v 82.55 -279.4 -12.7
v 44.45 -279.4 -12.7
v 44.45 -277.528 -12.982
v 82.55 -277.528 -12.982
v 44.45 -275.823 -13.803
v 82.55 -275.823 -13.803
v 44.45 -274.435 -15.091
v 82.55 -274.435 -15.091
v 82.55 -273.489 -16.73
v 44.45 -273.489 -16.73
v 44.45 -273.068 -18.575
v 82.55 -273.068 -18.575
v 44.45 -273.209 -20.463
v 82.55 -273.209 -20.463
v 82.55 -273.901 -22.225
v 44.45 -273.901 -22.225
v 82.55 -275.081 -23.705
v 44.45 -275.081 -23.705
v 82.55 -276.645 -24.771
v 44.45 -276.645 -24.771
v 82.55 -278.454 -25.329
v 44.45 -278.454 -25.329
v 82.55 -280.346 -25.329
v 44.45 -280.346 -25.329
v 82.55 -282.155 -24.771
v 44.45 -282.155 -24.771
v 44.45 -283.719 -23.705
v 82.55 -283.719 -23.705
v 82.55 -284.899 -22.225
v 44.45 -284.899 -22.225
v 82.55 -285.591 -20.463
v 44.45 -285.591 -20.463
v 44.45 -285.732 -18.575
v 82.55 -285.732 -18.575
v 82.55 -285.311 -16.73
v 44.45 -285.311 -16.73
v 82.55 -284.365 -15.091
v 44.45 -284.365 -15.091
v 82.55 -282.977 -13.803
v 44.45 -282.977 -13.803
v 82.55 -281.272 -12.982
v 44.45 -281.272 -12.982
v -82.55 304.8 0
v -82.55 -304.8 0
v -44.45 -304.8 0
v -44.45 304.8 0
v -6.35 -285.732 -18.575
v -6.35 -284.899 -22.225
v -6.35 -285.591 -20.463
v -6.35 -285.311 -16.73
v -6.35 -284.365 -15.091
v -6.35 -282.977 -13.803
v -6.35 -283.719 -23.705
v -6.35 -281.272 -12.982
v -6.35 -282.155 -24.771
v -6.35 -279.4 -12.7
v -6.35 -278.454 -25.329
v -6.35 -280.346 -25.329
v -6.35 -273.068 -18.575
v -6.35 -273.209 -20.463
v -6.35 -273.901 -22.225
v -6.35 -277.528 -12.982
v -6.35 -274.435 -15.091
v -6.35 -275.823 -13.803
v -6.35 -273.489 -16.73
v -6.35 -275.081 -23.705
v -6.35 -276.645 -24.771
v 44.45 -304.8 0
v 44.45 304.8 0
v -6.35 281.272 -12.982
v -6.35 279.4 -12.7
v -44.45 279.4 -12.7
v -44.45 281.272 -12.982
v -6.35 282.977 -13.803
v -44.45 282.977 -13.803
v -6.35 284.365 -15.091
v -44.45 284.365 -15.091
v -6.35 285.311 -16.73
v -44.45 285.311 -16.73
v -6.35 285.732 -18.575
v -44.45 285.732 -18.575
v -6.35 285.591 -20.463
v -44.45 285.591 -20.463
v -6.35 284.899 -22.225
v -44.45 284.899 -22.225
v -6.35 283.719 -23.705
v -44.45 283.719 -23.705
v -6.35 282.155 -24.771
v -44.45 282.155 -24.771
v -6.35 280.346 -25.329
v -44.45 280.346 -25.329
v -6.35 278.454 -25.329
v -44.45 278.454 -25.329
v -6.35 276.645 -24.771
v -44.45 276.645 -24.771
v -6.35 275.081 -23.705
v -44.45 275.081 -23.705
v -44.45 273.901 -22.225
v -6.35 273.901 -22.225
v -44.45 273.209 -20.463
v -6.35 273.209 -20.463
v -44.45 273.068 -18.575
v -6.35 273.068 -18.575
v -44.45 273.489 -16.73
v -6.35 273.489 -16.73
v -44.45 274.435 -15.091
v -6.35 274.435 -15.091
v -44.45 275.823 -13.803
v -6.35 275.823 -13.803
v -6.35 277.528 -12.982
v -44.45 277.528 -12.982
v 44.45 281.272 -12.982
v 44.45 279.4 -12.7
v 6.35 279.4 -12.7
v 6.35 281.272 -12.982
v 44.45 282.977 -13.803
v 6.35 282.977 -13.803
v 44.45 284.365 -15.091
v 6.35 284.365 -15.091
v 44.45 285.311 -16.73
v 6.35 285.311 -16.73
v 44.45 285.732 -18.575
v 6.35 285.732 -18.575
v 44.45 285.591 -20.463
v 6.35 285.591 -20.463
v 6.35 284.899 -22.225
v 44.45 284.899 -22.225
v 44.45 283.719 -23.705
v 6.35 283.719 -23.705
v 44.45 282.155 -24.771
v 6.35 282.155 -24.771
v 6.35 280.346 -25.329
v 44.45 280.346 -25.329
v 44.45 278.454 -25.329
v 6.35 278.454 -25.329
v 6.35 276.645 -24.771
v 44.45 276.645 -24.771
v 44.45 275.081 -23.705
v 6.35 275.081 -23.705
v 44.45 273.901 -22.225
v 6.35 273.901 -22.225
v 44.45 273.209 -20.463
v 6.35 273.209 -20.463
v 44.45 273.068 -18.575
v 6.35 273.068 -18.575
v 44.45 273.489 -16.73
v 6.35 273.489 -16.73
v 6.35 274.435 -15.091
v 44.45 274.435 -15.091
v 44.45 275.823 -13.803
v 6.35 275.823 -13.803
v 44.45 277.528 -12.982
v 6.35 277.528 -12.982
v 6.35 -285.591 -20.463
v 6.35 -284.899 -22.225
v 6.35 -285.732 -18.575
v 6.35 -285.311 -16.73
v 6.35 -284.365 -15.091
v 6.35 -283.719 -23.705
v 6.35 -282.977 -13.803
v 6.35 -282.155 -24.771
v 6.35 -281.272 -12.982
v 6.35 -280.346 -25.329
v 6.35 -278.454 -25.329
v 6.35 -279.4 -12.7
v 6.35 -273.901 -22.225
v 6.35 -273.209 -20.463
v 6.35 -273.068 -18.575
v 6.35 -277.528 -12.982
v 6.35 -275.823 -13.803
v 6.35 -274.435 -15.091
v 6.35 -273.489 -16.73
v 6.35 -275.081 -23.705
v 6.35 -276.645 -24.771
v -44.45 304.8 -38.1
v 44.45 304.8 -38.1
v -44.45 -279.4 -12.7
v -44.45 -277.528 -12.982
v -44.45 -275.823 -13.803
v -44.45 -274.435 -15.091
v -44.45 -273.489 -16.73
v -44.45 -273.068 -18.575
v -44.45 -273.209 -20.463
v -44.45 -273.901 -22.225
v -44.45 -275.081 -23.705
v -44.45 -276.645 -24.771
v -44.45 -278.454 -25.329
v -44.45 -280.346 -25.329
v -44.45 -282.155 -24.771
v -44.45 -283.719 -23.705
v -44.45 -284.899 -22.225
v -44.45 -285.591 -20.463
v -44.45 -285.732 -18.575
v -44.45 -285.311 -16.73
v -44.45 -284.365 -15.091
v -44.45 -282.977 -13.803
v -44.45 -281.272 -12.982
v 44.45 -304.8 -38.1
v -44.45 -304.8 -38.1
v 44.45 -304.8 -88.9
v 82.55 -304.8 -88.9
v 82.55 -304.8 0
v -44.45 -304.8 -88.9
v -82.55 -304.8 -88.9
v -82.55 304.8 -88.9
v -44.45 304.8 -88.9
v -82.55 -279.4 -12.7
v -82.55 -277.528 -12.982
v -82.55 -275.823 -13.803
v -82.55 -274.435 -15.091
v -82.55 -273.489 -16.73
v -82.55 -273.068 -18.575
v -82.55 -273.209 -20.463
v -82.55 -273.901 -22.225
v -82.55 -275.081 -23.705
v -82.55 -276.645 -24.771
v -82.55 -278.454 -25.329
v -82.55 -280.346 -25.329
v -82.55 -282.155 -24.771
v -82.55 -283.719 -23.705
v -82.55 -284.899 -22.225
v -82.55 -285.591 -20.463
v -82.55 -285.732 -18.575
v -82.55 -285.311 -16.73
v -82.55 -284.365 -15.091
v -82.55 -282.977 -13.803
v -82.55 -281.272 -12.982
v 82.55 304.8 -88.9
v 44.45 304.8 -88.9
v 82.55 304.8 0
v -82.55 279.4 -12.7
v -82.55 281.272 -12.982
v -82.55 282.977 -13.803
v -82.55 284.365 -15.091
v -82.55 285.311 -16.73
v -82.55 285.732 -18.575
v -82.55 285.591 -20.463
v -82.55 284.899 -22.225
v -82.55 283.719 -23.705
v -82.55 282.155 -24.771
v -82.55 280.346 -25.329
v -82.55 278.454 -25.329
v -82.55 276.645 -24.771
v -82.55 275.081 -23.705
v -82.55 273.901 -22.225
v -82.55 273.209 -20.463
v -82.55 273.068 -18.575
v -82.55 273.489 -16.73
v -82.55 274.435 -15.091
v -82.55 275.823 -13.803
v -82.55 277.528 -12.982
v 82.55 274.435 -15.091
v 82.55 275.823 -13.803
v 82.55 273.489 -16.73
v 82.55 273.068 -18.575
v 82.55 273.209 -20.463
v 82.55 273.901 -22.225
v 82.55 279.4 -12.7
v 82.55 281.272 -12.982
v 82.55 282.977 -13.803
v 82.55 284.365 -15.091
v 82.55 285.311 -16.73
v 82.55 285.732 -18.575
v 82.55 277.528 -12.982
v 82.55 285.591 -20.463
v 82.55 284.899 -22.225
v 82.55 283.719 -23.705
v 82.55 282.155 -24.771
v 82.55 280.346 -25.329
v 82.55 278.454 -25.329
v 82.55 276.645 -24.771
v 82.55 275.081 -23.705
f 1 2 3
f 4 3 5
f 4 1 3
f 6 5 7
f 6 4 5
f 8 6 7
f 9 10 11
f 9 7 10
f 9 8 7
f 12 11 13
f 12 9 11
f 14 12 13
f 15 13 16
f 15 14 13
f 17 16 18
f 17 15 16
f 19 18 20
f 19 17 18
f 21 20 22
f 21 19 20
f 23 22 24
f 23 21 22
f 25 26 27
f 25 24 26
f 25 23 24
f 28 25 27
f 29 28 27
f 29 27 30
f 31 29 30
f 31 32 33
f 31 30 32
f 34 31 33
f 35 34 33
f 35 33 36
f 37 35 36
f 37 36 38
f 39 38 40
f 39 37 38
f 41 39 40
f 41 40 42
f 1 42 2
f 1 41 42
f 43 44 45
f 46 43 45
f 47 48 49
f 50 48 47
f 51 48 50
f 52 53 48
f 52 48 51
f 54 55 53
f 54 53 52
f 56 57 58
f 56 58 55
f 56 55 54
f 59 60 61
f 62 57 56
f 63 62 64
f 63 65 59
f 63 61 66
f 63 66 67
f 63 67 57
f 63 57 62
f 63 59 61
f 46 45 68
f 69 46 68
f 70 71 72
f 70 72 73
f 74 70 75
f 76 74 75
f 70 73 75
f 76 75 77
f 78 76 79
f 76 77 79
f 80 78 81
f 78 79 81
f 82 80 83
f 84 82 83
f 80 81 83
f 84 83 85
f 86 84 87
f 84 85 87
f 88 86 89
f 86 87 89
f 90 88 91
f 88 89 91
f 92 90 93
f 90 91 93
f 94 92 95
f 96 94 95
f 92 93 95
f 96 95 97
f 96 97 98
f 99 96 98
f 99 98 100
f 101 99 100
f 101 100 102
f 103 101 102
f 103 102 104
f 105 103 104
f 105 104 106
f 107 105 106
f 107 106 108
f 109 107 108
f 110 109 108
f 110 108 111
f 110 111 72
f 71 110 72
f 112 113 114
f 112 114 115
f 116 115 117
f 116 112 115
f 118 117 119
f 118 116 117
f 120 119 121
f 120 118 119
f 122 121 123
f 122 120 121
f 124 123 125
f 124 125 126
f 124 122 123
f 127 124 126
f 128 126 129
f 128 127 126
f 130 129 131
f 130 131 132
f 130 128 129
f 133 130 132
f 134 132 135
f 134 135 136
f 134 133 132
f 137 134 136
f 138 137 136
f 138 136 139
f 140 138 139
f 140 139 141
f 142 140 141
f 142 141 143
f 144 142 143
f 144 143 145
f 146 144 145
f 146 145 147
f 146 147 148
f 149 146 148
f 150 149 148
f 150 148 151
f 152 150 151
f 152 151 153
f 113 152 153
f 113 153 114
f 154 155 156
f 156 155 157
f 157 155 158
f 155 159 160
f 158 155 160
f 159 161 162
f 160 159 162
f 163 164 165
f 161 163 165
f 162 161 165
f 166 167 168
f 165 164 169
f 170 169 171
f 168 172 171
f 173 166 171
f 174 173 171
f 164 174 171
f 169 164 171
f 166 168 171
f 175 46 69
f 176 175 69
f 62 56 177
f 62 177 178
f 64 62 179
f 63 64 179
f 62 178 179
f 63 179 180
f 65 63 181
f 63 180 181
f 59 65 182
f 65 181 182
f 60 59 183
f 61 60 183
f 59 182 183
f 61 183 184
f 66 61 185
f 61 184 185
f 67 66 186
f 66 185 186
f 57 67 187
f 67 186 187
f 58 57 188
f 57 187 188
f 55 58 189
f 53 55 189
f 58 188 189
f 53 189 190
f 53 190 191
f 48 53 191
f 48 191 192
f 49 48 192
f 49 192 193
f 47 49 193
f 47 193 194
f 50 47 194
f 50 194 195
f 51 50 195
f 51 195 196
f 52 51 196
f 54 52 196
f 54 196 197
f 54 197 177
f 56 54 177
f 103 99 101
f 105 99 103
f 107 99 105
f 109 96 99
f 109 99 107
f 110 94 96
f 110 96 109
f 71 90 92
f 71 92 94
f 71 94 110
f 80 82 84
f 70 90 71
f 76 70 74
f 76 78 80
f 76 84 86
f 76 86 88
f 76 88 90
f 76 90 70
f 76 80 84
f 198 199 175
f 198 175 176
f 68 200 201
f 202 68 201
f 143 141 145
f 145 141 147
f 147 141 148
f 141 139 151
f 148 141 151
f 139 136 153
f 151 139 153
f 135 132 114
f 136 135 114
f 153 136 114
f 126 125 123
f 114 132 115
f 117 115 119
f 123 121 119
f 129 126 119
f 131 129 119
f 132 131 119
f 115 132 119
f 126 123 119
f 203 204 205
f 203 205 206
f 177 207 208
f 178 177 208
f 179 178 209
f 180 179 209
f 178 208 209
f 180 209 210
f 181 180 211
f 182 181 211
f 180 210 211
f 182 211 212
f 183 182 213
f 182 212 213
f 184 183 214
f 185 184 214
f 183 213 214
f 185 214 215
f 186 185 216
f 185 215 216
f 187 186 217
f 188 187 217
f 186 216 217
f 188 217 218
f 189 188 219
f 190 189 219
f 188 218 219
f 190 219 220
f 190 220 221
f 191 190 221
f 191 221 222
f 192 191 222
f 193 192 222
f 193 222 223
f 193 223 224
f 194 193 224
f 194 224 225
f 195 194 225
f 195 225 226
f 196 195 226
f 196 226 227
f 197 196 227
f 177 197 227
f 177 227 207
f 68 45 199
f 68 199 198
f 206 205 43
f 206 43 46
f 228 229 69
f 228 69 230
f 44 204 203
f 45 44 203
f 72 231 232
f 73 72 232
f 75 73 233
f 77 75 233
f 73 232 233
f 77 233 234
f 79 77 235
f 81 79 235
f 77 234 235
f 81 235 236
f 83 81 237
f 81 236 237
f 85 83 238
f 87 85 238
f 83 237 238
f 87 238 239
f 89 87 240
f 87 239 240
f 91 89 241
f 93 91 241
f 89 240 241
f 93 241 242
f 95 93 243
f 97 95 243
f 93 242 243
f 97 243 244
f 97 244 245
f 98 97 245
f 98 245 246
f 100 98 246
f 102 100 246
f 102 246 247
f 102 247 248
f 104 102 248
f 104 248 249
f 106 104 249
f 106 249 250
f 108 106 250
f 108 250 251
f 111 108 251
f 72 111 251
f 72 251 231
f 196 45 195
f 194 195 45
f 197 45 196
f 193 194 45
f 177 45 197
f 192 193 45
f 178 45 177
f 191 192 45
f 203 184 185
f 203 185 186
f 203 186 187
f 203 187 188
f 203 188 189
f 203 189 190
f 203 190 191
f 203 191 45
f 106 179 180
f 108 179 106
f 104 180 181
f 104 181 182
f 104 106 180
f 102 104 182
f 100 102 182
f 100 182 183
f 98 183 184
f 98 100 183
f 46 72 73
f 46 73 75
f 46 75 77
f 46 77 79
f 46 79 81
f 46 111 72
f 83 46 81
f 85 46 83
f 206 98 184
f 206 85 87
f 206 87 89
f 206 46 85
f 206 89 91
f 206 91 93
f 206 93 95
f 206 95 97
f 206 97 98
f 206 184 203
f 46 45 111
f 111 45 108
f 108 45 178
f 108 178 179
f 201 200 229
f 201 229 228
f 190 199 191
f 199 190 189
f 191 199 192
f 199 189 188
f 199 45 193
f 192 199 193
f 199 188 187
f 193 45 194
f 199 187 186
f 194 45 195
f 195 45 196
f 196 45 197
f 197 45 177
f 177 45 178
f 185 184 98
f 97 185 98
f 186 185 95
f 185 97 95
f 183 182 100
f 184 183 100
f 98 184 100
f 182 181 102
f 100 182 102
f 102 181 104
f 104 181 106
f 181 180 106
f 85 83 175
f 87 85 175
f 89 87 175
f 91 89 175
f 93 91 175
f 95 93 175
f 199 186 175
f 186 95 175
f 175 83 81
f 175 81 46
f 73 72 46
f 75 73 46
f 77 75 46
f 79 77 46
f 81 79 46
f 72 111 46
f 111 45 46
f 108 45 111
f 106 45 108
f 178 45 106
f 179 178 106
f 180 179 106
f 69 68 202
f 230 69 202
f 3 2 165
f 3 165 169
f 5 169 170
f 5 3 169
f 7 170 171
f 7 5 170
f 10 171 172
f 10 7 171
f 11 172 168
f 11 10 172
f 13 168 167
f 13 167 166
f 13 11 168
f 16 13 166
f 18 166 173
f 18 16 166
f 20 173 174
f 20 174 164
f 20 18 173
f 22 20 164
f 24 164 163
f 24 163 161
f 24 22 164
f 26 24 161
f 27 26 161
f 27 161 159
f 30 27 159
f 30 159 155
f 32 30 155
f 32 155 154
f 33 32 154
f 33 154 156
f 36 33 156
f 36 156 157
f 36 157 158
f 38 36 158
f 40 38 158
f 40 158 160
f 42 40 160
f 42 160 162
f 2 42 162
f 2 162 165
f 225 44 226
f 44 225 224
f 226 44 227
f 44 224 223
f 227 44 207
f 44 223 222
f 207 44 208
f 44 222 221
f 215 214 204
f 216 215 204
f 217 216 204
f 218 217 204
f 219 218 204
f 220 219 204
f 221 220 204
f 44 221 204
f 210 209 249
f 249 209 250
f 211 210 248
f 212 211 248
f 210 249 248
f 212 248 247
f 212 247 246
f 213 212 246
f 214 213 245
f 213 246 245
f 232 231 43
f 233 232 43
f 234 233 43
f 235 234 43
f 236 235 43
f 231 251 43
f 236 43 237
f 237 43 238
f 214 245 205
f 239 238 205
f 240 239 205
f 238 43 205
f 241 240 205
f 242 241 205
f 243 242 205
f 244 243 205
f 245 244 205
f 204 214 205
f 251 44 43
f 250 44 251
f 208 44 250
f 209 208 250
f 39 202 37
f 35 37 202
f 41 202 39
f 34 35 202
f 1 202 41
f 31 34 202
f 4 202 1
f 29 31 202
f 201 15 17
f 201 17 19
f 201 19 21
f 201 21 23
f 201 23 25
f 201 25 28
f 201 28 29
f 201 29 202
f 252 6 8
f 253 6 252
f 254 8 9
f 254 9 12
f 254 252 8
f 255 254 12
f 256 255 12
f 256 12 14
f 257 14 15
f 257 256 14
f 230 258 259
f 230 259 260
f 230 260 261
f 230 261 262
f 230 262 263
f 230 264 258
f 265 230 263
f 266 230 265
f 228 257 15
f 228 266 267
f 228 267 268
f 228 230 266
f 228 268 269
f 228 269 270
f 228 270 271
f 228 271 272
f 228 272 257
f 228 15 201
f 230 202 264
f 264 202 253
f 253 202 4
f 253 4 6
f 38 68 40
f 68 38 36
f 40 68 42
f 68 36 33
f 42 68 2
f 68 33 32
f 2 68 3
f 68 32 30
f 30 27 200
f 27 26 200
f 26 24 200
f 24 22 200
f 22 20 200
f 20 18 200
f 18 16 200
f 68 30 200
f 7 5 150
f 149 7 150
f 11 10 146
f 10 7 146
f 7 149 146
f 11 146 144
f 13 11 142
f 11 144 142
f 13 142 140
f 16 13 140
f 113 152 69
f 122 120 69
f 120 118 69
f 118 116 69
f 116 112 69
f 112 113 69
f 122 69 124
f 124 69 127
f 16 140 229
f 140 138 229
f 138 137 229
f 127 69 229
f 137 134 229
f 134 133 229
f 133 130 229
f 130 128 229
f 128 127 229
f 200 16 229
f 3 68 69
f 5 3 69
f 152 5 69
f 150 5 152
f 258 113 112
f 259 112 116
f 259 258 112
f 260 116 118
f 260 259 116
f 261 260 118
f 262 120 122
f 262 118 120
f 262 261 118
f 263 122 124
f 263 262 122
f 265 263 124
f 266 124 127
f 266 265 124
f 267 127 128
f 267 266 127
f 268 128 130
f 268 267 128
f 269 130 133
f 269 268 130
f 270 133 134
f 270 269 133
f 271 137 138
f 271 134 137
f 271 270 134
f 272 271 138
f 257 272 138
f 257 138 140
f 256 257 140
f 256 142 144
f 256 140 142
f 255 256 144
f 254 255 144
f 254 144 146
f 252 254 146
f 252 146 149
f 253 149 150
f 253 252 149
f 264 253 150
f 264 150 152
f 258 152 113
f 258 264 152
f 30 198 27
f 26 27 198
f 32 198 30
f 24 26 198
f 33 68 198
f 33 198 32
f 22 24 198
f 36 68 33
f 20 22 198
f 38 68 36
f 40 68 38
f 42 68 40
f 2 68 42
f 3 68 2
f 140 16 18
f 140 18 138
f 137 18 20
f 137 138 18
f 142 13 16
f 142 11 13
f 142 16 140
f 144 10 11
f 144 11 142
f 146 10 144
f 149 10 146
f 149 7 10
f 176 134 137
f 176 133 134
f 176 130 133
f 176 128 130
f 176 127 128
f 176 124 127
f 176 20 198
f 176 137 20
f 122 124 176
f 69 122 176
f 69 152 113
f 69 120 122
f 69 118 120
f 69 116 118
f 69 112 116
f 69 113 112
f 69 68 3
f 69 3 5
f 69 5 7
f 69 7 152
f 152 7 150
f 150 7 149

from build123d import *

# Parameters (mm, degrees)
SKETCH1_W             = 88.9
SKETCH1_H             = 609.6
BOSS_EXTRUDE1_DEPTH   = 38.1
SKETCH2_W             = 38.1
SKETCH2_H             = 88.9
BOSS_EXTRUDE2_DEPTH   = 609.6
BOSS_EXTRUDE2_2_DEPTH = 609.6
SKETCH3_R             = 6.35
CUT_EXTRUDE1_DEPTH    = 76.2


with BuildPart() as part:
    # Sketch1 → Boss-Extrude1 (new body)
    with BuildSketch(Plane.XY):
        Rectangle(SKETCH1_W, SKETCH1_H)
    extrude(amount=-BOSS_EXTRUDE1_DEPTH)


with BuildPart() as body_2:
    # Sketch2 → Boss-Extrude2 (new body)
    with BuildSketch(Plane(origin=(0, 304.8, 0), x_dir=(1, 0, 0), z_dir=(0, 1, 0))):
        with Locations((63.5, 44.45)):
            Rectangle(SKETCH2_W, SKETCH2_H)
    extrude(amount=-BOSS_EXTRUDE2_DEPTH)


with BuildPart() as body_3:
    # Sketch2 → Boss-Extrude2 2 (new body)
    with BuildSketch(Plane(origin=(0, 304.8, 0), x_dir=(1, 0, 0), z_dir=(0, 1, 0))):
        with Locations((-63.5, 44.45)):
            Rectangle(SKETCH2_W, SKETCH2_H)
    extrude(amount=-BOSS_EXTRUDE2_2_DEPTH)


with BuildPart() as cut_extrude1_tool:
    # Sketch3 → Cut-Extrude1 (new body)
    with BuildSketch(Plane.ZY.offset(82.55)):
        with Locations((-19.05, 279.4)):
            Circle(SKETCH3_R)
        with Locations((-19.05, -279.4)):
            Circle(SKETCH3_R)
    cut_extrude1 = extrude(amount=-CUT_EXTRUDE1_DEPTH)


with BuildPart() as part_1:
    add(part.part)

    # Cut-Extrude1: cut by cut_extrude1_tool
    add(cut_extrude1_tool.part, mode=Mode.SUBTRACT)


with BuildPart() as body_3_1:
    add(body_3.part)

    # Cut-Extrude1: cut by cut_extrude1_tool
    add(cut_extrude1_tool.part, mode=Mode.SUBTRACT)


with BuildPart() as mirror1_tool:
    # Mirror1: Cut-Extrude1 across plane
    add(cut_extrude1.mirror(Plane.ZY))


with BuildPart() as part_2:
    add(part_1.part)

    # Mirror1: cut by mirror1_tool
    add(mirror1_tool.part, mode=Mode.SUBTRACT)


with BuildPart() as body_2_1:
    add(body_2.part)

    # Mirror1: cut by mirror1_tool
    add(mirror1_tool.part, mode=Mode.SUBTRACT)


solid = Compound([body_3_1.part, part_2.part, body_2_1.part])
